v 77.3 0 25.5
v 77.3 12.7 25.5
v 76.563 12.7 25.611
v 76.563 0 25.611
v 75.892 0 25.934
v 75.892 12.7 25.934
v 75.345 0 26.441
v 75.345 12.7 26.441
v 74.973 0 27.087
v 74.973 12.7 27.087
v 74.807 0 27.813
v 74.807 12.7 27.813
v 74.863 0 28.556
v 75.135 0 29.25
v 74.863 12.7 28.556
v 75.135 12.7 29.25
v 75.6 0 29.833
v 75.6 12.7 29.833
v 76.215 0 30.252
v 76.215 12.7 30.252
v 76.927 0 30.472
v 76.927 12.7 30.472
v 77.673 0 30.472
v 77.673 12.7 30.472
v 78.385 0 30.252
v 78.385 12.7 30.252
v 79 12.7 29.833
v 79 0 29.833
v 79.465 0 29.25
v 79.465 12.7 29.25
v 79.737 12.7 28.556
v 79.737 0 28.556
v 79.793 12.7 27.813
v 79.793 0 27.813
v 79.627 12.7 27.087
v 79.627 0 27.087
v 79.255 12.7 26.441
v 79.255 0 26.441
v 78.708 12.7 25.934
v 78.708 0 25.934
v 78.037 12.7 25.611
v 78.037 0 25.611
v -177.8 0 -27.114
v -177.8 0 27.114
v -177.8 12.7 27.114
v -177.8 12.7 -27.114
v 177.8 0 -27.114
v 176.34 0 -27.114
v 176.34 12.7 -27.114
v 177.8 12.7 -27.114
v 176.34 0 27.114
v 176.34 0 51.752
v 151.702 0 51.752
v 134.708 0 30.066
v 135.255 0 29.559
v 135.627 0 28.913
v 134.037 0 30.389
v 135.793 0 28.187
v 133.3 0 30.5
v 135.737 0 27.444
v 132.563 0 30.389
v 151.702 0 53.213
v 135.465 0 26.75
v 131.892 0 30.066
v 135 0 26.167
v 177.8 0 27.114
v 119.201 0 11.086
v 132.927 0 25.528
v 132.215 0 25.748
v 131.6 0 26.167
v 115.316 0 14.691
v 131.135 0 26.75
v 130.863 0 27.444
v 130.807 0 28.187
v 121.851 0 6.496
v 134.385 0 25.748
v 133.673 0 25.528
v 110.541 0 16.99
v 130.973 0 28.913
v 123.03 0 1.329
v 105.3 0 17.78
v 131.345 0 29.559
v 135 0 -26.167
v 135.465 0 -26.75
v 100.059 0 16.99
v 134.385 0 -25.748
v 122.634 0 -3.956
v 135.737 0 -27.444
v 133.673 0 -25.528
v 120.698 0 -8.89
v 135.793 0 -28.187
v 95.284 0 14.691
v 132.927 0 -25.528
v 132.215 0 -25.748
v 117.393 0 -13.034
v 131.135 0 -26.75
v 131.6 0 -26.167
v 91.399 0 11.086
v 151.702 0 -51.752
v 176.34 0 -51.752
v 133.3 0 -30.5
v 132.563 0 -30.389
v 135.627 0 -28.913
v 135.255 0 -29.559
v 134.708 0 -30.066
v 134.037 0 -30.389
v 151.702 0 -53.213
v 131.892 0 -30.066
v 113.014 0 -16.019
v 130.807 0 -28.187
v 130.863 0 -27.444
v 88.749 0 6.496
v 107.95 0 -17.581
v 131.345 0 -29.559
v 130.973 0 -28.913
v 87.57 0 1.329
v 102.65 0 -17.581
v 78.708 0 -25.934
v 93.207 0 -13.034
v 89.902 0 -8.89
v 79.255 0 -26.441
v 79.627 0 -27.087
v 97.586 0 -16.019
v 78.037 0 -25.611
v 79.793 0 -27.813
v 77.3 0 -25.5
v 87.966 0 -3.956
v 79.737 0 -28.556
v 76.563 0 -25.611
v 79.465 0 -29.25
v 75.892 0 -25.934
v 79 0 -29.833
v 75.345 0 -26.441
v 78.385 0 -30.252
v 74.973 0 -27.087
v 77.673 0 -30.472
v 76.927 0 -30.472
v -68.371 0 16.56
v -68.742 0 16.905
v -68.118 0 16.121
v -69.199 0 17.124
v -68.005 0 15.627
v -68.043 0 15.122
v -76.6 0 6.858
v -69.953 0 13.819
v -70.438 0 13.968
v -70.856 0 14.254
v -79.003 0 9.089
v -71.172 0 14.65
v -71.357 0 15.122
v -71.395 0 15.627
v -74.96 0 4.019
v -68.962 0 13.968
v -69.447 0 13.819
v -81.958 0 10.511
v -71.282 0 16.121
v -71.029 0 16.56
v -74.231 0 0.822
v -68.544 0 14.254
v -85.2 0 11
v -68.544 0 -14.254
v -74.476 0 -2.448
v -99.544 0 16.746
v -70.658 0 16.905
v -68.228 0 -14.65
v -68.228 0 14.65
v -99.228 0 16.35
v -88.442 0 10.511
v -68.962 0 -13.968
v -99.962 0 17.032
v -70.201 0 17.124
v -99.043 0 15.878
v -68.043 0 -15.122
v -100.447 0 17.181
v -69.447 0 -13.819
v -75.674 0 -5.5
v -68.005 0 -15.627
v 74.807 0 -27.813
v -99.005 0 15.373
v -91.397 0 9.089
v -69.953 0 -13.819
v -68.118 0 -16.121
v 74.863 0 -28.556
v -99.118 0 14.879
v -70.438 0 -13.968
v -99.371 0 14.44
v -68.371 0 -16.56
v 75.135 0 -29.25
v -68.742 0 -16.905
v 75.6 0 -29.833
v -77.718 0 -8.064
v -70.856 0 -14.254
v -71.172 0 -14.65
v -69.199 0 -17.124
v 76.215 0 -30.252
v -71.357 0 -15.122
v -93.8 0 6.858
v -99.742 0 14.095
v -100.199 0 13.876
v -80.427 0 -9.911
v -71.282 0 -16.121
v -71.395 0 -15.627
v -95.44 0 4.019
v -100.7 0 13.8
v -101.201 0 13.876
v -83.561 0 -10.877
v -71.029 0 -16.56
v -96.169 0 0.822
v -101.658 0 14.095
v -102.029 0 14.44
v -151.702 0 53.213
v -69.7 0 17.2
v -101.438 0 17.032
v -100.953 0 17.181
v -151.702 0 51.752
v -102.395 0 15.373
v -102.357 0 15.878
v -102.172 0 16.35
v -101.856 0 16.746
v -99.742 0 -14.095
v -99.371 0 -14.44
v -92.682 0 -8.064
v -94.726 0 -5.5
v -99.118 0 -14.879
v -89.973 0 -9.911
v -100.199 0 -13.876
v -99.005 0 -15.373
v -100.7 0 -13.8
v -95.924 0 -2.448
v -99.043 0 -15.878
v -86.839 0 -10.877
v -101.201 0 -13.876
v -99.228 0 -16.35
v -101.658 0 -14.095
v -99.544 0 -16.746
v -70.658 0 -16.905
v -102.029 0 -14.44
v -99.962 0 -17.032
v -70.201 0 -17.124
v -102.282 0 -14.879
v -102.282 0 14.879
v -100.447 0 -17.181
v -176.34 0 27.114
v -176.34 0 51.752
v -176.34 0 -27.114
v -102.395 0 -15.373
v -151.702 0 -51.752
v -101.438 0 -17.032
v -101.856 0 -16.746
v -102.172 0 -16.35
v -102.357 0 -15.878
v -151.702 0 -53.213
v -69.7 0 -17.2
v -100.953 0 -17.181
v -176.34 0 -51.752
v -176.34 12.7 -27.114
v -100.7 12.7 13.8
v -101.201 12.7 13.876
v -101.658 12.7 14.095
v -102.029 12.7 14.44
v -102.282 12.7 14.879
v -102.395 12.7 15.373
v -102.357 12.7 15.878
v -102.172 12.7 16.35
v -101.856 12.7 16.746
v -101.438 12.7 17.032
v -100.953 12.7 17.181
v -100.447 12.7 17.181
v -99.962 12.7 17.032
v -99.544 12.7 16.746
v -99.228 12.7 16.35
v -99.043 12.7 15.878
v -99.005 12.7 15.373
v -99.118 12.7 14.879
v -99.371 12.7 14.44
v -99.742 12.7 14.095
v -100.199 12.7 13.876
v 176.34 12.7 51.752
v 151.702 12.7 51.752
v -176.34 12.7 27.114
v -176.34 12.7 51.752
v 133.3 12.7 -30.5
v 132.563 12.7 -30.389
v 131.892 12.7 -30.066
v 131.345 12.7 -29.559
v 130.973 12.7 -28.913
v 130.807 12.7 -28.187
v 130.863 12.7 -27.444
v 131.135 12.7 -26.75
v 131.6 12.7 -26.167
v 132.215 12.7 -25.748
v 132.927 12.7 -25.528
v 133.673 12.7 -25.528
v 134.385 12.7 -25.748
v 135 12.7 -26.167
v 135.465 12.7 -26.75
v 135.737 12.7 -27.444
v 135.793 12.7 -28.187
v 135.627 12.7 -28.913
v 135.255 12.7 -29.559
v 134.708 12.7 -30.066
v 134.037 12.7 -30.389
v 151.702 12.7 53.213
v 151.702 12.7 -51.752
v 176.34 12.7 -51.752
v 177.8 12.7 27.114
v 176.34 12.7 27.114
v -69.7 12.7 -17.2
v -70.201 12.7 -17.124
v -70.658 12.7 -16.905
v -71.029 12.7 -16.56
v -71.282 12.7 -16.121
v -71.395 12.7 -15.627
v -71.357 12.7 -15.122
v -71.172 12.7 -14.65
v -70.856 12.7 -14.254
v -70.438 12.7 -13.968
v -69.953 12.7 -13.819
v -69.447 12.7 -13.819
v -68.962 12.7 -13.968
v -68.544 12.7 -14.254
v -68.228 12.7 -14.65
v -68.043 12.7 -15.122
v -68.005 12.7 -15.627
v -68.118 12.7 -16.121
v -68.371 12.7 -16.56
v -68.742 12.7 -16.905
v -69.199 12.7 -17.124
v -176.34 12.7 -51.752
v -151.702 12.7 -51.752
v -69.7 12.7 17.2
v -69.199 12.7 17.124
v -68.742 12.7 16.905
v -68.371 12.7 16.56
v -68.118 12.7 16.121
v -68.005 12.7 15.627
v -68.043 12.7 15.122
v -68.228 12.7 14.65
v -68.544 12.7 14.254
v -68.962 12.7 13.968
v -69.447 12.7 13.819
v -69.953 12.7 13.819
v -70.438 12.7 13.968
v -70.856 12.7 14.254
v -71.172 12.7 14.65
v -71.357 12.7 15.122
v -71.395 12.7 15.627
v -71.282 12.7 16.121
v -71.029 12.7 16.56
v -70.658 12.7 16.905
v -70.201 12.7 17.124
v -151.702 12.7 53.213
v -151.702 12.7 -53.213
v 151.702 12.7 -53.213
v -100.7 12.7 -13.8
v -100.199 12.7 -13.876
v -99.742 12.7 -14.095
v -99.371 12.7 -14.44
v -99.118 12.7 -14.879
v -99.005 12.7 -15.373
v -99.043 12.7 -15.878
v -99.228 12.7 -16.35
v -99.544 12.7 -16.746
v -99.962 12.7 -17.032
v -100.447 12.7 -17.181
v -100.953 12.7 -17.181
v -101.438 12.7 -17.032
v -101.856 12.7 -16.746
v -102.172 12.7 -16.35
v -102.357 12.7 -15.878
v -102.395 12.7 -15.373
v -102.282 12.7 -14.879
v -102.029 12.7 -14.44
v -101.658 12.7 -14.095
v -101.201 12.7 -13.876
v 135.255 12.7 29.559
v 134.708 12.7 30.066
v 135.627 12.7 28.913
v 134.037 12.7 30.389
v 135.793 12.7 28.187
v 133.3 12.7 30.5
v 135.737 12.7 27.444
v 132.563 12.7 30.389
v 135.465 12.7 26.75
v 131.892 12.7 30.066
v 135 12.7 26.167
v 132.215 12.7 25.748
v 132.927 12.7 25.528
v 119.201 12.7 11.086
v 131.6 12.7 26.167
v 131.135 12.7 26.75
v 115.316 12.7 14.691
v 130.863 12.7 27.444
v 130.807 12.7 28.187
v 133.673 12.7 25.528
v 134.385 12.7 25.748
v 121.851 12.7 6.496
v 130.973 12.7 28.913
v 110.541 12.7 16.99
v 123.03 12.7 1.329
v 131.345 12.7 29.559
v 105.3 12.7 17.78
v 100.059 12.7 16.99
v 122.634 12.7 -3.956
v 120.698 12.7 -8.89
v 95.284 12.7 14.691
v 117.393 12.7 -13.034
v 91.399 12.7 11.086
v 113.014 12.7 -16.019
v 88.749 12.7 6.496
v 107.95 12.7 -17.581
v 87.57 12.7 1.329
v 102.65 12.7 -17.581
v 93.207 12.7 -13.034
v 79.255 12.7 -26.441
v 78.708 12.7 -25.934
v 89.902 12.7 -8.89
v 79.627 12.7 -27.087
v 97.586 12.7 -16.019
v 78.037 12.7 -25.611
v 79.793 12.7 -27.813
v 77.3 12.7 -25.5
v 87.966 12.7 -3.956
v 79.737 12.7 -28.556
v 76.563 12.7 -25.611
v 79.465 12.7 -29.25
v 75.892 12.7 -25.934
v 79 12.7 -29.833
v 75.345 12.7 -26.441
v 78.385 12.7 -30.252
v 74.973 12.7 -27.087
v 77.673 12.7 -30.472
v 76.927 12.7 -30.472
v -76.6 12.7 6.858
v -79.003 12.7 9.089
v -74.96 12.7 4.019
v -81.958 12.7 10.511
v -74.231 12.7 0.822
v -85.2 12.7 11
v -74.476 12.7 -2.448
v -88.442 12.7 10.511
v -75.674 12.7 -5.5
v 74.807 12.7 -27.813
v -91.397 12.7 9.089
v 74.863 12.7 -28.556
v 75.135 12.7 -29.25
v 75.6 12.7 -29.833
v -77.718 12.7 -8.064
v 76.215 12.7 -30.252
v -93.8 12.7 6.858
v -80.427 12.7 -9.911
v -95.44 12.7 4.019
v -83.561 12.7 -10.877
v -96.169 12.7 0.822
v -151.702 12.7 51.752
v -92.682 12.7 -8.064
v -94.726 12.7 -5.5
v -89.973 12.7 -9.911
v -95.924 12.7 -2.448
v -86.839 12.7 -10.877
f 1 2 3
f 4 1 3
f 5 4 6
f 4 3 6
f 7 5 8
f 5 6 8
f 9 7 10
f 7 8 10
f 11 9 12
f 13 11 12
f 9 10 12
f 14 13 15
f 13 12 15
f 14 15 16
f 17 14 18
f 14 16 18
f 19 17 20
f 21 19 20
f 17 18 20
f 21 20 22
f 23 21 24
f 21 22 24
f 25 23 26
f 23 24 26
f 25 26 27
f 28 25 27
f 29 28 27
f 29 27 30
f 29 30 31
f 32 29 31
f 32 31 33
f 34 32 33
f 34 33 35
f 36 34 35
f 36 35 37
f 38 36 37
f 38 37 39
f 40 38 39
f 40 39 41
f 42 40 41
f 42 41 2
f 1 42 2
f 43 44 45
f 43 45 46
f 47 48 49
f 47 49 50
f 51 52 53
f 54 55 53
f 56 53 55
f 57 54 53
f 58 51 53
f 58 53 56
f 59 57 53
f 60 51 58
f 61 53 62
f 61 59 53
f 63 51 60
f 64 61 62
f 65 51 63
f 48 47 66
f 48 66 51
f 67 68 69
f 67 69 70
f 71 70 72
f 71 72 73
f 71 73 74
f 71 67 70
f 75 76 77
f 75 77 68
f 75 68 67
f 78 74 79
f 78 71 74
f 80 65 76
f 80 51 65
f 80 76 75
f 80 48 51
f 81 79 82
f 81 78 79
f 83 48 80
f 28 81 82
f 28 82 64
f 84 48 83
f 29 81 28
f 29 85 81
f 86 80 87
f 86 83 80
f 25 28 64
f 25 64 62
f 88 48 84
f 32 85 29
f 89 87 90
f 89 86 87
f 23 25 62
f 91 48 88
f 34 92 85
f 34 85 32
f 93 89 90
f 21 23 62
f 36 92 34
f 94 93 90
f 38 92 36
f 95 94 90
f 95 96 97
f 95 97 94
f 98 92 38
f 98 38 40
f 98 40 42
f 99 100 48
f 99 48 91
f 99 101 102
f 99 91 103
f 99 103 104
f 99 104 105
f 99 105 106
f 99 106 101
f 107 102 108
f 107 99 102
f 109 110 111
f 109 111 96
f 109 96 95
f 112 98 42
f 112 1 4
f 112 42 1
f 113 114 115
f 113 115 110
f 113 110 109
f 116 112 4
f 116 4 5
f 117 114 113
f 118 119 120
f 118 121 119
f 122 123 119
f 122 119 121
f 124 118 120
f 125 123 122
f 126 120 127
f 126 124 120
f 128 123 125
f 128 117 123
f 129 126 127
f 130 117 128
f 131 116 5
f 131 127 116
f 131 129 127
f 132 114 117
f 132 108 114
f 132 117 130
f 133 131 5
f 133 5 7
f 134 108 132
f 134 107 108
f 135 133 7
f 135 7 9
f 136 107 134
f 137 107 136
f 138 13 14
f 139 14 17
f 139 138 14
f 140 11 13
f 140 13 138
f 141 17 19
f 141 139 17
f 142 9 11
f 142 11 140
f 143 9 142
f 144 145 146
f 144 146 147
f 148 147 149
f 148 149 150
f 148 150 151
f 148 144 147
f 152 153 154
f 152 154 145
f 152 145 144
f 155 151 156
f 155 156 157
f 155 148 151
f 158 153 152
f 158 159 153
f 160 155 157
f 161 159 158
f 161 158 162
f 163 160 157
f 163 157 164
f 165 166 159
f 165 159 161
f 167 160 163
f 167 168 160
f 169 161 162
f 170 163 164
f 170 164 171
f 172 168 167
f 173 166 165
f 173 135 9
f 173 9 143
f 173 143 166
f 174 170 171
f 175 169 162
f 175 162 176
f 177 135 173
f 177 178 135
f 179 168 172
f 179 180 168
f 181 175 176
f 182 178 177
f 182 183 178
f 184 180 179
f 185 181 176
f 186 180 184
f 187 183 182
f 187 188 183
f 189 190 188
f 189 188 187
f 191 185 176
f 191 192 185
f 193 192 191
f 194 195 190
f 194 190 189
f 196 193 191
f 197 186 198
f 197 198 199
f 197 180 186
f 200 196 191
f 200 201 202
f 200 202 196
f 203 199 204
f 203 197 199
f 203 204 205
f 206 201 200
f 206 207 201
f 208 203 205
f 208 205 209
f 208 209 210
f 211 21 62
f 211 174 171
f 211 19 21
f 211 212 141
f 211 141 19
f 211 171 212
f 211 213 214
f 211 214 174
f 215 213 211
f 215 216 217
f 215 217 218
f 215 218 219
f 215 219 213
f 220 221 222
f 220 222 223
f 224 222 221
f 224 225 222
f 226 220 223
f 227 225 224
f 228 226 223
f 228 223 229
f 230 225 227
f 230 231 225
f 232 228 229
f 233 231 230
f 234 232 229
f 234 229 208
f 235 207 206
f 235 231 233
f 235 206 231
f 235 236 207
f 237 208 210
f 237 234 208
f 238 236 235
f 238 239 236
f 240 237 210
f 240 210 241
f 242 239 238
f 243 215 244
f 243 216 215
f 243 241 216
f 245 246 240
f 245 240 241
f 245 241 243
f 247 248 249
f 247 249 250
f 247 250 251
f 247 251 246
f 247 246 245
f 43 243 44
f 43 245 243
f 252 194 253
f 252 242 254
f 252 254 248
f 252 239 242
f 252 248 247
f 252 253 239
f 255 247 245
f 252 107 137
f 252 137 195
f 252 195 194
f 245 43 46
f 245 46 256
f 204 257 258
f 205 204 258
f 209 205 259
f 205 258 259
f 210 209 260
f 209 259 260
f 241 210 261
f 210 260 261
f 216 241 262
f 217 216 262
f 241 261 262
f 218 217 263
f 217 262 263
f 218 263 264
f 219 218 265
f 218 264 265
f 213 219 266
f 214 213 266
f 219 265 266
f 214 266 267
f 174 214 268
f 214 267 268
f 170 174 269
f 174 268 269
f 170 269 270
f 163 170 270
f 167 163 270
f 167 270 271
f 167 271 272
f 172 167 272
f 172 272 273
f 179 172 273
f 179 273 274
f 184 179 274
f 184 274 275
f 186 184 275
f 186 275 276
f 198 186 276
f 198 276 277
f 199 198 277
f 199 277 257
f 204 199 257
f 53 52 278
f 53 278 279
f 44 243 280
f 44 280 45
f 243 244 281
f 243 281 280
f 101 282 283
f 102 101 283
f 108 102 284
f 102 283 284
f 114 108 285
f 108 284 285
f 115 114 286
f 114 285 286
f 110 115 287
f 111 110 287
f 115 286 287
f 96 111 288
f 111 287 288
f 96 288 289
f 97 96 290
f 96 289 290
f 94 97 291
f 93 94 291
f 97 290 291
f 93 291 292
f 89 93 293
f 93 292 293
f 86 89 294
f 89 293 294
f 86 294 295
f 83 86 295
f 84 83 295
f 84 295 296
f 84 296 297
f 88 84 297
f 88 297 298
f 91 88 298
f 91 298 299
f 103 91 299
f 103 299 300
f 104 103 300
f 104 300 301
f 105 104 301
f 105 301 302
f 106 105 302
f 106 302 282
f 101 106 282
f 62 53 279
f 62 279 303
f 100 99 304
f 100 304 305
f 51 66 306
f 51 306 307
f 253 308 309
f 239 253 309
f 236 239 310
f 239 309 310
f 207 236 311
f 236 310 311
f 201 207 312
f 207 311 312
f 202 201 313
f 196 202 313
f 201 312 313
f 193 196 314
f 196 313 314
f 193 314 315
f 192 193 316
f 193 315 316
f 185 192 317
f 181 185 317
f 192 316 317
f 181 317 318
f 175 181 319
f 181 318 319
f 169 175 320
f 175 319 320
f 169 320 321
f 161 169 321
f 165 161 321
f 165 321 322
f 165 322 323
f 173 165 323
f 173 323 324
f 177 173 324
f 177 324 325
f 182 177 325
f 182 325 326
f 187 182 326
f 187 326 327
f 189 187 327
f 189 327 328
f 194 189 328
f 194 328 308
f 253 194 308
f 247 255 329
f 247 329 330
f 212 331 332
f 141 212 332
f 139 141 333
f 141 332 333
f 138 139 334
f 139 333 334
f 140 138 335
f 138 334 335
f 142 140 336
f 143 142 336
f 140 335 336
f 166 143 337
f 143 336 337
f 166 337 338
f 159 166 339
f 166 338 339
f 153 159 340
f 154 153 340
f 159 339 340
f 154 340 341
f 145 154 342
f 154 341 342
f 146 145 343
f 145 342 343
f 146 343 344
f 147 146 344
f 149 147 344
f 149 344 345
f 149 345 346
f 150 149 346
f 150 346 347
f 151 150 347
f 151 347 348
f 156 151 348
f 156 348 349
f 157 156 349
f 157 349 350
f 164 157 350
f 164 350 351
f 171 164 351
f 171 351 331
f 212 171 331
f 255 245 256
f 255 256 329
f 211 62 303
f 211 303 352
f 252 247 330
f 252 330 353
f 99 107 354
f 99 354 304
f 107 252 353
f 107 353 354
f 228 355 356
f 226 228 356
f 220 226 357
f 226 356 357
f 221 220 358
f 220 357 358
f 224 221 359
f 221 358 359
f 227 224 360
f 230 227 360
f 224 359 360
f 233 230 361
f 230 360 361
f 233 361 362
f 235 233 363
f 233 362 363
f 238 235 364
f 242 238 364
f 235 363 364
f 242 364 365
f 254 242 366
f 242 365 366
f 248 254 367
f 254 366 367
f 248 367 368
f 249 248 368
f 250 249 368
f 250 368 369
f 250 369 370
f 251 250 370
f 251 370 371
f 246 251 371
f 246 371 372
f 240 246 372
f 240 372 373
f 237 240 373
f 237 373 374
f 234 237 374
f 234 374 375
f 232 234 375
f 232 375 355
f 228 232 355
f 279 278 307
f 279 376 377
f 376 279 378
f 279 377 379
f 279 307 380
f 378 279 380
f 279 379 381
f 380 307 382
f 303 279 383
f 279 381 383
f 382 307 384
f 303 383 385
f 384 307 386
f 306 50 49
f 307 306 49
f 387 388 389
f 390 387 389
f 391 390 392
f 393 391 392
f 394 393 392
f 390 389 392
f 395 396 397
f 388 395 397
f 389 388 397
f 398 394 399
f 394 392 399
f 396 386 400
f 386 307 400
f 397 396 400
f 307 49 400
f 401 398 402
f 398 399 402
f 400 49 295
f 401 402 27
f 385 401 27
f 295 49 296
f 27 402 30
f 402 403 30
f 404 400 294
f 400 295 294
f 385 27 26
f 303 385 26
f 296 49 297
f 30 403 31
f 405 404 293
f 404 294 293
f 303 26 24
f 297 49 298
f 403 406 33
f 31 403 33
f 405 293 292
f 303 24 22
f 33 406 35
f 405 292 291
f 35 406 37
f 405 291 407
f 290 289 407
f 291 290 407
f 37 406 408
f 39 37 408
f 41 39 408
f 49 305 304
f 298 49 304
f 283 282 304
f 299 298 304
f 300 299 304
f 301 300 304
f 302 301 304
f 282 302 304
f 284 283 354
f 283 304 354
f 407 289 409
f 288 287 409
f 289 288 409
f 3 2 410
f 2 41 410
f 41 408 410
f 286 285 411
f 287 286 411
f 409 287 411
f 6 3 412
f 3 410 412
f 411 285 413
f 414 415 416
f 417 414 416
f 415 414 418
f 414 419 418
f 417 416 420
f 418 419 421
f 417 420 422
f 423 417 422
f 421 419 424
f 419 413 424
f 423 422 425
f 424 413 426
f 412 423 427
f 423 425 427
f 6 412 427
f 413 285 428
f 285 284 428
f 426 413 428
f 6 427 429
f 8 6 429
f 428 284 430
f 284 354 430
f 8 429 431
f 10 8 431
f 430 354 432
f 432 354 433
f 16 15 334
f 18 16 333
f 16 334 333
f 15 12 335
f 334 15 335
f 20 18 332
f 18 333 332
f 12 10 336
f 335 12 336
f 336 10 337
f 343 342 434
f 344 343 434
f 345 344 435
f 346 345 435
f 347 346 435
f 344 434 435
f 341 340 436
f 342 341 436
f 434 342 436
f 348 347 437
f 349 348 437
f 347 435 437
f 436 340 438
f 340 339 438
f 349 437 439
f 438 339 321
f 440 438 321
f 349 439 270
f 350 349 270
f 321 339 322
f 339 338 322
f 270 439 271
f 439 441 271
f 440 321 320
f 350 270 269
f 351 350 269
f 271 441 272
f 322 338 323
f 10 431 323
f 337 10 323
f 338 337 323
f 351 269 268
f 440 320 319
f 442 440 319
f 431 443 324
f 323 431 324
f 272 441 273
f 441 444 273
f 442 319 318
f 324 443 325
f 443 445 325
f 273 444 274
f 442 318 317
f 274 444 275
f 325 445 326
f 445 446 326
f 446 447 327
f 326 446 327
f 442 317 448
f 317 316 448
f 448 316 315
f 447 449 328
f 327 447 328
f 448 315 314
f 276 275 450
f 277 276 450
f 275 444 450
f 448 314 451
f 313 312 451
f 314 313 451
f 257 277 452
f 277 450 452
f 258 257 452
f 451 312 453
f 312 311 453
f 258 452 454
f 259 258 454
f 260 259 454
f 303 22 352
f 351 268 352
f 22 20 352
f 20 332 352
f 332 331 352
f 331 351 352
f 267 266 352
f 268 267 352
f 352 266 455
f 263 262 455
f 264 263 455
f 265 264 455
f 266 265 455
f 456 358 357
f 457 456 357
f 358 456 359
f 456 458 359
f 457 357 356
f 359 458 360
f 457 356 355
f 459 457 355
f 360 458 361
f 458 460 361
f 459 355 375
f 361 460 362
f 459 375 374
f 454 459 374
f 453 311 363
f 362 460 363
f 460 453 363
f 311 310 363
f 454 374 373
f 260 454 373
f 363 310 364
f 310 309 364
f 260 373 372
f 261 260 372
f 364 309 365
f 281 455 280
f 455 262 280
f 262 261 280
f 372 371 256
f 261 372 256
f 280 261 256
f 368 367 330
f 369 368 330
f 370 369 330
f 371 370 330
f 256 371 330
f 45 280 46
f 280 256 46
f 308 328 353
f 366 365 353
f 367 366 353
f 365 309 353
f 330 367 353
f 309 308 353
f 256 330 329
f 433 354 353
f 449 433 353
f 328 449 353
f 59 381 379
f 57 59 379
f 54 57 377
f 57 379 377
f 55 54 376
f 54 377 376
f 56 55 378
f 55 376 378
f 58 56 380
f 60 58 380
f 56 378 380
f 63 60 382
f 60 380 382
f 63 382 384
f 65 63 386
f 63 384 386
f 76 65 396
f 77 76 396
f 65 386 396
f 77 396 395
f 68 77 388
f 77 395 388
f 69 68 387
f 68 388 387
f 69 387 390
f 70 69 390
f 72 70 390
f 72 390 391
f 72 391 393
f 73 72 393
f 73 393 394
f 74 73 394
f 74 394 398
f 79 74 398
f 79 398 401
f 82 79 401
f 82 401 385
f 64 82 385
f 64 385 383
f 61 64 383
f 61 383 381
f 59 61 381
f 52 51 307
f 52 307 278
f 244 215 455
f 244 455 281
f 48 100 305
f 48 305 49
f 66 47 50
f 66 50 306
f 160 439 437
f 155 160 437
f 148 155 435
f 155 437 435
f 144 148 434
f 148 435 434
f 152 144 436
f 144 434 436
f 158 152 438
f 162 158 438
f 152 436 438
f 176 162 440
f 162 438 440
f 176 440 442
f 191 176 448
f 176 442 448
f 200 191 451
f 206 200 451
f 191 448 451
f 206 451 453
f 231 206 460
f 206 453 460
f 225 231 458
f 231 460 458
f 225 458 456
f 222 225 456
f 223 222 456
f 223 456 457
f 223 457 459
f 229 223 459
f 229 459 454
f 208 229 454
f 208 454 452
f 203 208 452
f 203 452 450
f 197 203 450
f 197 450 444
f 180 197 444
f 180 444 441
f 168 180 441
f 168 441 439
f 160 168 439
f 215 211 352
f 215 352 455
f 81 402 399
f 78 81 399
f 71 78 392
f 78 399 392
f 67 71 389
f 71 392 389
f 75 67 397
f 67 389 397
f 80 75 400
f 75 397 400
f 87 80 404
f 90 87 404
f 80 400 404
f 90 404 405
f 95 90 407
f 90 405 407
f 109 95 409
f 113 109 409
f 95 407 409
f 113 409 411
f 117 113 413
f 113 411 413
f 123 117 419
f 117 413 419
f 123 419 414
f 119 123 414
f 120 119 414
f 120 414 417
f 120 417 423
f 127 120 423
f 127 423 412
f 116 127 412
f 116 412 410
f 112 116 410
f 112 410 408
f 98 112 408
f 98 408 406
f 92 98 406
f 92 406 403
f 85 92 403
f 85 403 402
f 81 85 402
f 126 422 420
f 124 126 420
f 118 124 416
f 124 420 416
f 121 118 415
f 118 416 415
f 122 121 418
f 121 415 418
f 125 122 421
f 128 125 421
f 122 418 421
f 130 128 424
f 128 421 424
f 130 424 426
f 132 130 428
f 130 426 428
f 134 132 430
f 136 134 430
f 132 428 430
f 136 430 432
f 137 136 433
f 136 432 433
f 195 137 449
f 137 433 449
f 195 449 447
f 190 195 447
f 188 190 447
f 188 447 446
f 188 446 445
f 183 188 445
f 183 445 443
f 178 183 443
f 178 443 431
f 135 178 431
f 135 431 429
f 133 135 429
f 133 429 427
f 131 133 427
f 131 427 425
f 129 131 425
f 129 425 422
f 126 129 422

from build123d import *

# Parameters (mm, degrees)
BOSS_EXTRUDE1_DEPTH = 12.7
CUT_EXTRUDE1_REACH  = 188.026
SKETCH2_R           = 2.5
SKETCH2_R_2         = 17.78
SKETCH2_R_3         = 11
SKETCH2_R_4         = 1.7


with BuildPart() as part:
    # Sketch1 → Boss-Extrude1 (new body)
    with BuildSketch(Plane(origin=(0, 0, 0), x_dir=(1, 0, 0), z_dir=(0, 1, 0))):
        Polygon((151.7015, 53.213), (151.7015, 51.7525), (176.3395, 51.7525), (176.3395, 27.1145), (177.8, 27.1145), (177.8, -27.1145), (176.3395, -27.1145), (176.3395, -51.7525), (151.7015, -51.7525), (151.7015, -53.213), (-151.7015, -53.213), (-151.7015, -51.7525), (-176.3395, -51.7525), (-176.3395, -27.1145), (-177.8, -27.1145), (-177.8, 27.1145), (-176.3395, 27.1145), (-176.3395, 51.7525), (-151.7015, 51.7525), (-151.7015, 53.213), align=None)
    extrude(amount=BOSS_EXTRUDE1_DEPTH)

    # Sketch2 → Cut-Extrude1 (cut, up to next)
    with BuildSketch(Plane(origin=(0, 12.7, 0), x_dir=(1, 0, 0), z_dir=(0, 1, 0)), mode=Mode.PRIVATE) as cut_extrude1_sk1:
        with Locations(Location((133.3, -28, 0), (0, 0, 270))):
            Circle(SKETCH2_R)
    cut_extrude1_tool1 = extrude(cut_extrude1_sk1.sketch, amount=-CUT_EXTRUDE1_REACH, mode=Mode.PRIVATE) & part.part
    # Sketch2 → Cut-Extrude1 (cut, up to next)
    with BuildSketch(Plane(origin=(0, 12.7, 0), x_dir=(1, 0, 0), z_dir=(0, 1, 0)), mode=Mode.PRIVATE) as cut_extrude1_sk2:
        with Locations(Location((77.3, -28, 0), (0, 0, 90))):
            Circle(SKETCH2_R)
    cut_extrude1_tool2 = extrude(cut_extrude1_sk2.sketch, amount=-CUT_EXTRUDE1_REACH, mode=Mode.PRIVATE) & part.part
    # Sketch2 → Cut-Extrude1 (cut, up to next)
    with BuildSketch(Plane(origin=(0, 12.7, 0), x_dir=(1, 0, 0), z_dir=(0, 1, 0)), mode=Mode.PRIVATE) as cut_extrude1_sk3:
        with Locations(Location((133.3, 28, 0), (0, 0, 90))):
            Circle(SKETCH2_R)
    cut_extrude1_tool3 = extrude(cut_extrude1_sk3.sketch, amount=-CUT_EXTRUDE1_REACH, mode=Mode.PRIVATE) & part.part
    # Sketch2 → Cut-Extrude1 (cut, up to next)
    with BuildSketch(Plane(origin=(0, 12.7, 0), x_dir=(1, 0, 0), z_dir=(0, 1, 0)), mode=Mode.PRIVATE) as cut_extrude1_sk4:
        with Locations(Location((77.3, 28, 0), (0, 0, 270))):
            Circle(SKETCH2_R)
    cut_extrude1_tool4 = extrude(cut_extrude1_sk4.sketch, amount=-CUT_EXTRUDE1_REACH, mode=Mode.PRIVATE) & part.part
    # Sketch2 → Cut-Extrude1 (cut, up to next)
    with BuildSketch(Plane(origin=(0, 12.7, 0), x_dir=(1, 0, 0), z_dir=(0, 1, 0)), mode=Mode.PRIVATE) as cut_extrude1_sk5:
        with Locations(Location((105.3, 0, 0), (0, 0, 270))):
            Circle(SKETCH2_R_2)
    cut_extrude1_tool5 = extrude(cut_extrude1_sk5.sketch, amount=-CUT_EXTRUDE1_REACH, mode=Mode.PRIVATE) & part.part
    # Sketch2 → Cut-Extrude1 (cut, up to next)
    with BuildSketch(Plane(origin=(0, 12.7, 0), x_dir=(1, 0, 0), z_dir=(0, 1, 0)), mode=Mode.PRIVATE) as cut_extrude1_sk6:
        with Locations(Location((-85.2, 0, 0), (0, 0, 270))):
            Circle(SKETCH2_R_3)
    cut_extrude1_tool6 = extrude(cut_extrude1_sk6.sketch, amount=-CUT_EXTRUDE1_REACH, mode=Mode.PRIVATE) & part.part
    # Sketch2 → Cut-Extrude1 (cut, up to next)
    with BuildSketch(Plane(origin=(0, 12.7, 0), x_dir=(1, 0, 0), z_dir=(0, 1, 0)), mode=Mode.PRIVATE) as cut_extrude1_sk7:
        with Locations(Location((-100.7, 15.5, 0), (0, 0, 270))):
            Circle(SKETCH2_R_4)
    cut_extrude1_tool7 = extrude(cut_extrude1_sk7.sketch, amount=-CUT_EXTRUDE1_REACH, mode=Mode.PRIVATE) & part.part
    # Sketch2 → Cut-Extrude1 (cut, up to next)
    with BuildSketch(Plane(origin=(0, 12.7, 0), x_dir=(1, 0, 0), z_dir=(0, 1, 0)), mode=Mode.PRIVATE) as cut_extrude1_sk8:
        with Locations(Location((-69.7, 15.5, 0), (0, 0, 90))):
            Circle(SKETCH2_R_4)
    cut_extrude1_tool8 = extrude(cut_extrude1_sk8.sketch, amount=-CUT_EXTRUDE1_REACH, mode=Mode.PRIVATE) & part.part
    # Sketch2 → Cut-Extrude1 (cut, up to next)
    with BuildSketch(Plane(origin=(0, 12.7, 0), x_dir=(1, 0, 0), z_dir=(0, 1, 0)), mode=Mode.PRIVATE) as cut_extrude1_sk9:
        with Locations(Location((-69.7, -15.5, 0), (0, 0, 270))):
            Circle(SKETCH2_R_4)
    cut_extrude1_tool9 = extrude(cut_extrude1_sk9.sketch, amount=-CUT_EXTRUDE1_REACH, mode=Mode.PRIVATE) & part.part
    # Sketch2 → Cut-Extrude1 (cut, up to next)
    with BuildSketch(Plane(origin=(0, 12.7, 0), x_dir=(1, 0, 0), z_dir=(0, 1, 0)), mode=Mode.PRIVATE) as cut_extrude1_sk10:
        with Locations(Location((-100.7, -15.5, 0), (0, 0, 90))):
            Circle(SKETCH2_R_4)
    cut_extrude1_tool10 = extrude(cut_extrude1_sk10.sketch, amount=-CUT_EXTRUDE1_REACH, mode=Mode.PRIVATE) & part.part
    add(cut_extrude1_tool1.solids().sort_by_distance((133.3, 12.7, 28))[0], mode=Mode.SUBTRACT)
    add(cut_extrude1_tool2.solids().sort_by_distance((77.3, 12.7, 28))[0], mode=Mode.SUBTRACT)
    add(cut_extrude1_tool3.solids().sort_by_distance((133.3, 12.7, -28))[0], mode=Mode.SUBTRACT)
    add(cut_extrude1_tool4.solids().sort_by_distance((77.3, 12.7, -28))[0], mode=Mode.SUBTRACT)
    add(cut_extrude1_tool5.solids().sort_by_distance((105.3, 12.7, 0))[0], mode=Mode.SUBTRACT)
    add(cut_extrude1_tool6.solids().sort_by_distance((-85.2, 12.7, 0))[0], mode=Mode.SUBTRACT)
    add(cut_extrude1_tool7.solids().sort_by_distance((-100.7, 12.7, -15.5))[0], mode=Mode.SUBTRACT)
    add(cut_extrude1_tool8.solids().sort_by_distance((-69.7, 12.7, -15.5))[0], mode=Mode.SUBTRACT)
    add(cut_extrude1_tool9.solids().sort_by_distance((-69.7, 12.7, 15.5))[0], mode=Mode.SUBTRACT)
    add(cut_extrude1_tool10.solids().sort_by_distance((-100.7, 12.7, 15.5))[0], mode=Mode.SUBTRACT)


solid = part.part
